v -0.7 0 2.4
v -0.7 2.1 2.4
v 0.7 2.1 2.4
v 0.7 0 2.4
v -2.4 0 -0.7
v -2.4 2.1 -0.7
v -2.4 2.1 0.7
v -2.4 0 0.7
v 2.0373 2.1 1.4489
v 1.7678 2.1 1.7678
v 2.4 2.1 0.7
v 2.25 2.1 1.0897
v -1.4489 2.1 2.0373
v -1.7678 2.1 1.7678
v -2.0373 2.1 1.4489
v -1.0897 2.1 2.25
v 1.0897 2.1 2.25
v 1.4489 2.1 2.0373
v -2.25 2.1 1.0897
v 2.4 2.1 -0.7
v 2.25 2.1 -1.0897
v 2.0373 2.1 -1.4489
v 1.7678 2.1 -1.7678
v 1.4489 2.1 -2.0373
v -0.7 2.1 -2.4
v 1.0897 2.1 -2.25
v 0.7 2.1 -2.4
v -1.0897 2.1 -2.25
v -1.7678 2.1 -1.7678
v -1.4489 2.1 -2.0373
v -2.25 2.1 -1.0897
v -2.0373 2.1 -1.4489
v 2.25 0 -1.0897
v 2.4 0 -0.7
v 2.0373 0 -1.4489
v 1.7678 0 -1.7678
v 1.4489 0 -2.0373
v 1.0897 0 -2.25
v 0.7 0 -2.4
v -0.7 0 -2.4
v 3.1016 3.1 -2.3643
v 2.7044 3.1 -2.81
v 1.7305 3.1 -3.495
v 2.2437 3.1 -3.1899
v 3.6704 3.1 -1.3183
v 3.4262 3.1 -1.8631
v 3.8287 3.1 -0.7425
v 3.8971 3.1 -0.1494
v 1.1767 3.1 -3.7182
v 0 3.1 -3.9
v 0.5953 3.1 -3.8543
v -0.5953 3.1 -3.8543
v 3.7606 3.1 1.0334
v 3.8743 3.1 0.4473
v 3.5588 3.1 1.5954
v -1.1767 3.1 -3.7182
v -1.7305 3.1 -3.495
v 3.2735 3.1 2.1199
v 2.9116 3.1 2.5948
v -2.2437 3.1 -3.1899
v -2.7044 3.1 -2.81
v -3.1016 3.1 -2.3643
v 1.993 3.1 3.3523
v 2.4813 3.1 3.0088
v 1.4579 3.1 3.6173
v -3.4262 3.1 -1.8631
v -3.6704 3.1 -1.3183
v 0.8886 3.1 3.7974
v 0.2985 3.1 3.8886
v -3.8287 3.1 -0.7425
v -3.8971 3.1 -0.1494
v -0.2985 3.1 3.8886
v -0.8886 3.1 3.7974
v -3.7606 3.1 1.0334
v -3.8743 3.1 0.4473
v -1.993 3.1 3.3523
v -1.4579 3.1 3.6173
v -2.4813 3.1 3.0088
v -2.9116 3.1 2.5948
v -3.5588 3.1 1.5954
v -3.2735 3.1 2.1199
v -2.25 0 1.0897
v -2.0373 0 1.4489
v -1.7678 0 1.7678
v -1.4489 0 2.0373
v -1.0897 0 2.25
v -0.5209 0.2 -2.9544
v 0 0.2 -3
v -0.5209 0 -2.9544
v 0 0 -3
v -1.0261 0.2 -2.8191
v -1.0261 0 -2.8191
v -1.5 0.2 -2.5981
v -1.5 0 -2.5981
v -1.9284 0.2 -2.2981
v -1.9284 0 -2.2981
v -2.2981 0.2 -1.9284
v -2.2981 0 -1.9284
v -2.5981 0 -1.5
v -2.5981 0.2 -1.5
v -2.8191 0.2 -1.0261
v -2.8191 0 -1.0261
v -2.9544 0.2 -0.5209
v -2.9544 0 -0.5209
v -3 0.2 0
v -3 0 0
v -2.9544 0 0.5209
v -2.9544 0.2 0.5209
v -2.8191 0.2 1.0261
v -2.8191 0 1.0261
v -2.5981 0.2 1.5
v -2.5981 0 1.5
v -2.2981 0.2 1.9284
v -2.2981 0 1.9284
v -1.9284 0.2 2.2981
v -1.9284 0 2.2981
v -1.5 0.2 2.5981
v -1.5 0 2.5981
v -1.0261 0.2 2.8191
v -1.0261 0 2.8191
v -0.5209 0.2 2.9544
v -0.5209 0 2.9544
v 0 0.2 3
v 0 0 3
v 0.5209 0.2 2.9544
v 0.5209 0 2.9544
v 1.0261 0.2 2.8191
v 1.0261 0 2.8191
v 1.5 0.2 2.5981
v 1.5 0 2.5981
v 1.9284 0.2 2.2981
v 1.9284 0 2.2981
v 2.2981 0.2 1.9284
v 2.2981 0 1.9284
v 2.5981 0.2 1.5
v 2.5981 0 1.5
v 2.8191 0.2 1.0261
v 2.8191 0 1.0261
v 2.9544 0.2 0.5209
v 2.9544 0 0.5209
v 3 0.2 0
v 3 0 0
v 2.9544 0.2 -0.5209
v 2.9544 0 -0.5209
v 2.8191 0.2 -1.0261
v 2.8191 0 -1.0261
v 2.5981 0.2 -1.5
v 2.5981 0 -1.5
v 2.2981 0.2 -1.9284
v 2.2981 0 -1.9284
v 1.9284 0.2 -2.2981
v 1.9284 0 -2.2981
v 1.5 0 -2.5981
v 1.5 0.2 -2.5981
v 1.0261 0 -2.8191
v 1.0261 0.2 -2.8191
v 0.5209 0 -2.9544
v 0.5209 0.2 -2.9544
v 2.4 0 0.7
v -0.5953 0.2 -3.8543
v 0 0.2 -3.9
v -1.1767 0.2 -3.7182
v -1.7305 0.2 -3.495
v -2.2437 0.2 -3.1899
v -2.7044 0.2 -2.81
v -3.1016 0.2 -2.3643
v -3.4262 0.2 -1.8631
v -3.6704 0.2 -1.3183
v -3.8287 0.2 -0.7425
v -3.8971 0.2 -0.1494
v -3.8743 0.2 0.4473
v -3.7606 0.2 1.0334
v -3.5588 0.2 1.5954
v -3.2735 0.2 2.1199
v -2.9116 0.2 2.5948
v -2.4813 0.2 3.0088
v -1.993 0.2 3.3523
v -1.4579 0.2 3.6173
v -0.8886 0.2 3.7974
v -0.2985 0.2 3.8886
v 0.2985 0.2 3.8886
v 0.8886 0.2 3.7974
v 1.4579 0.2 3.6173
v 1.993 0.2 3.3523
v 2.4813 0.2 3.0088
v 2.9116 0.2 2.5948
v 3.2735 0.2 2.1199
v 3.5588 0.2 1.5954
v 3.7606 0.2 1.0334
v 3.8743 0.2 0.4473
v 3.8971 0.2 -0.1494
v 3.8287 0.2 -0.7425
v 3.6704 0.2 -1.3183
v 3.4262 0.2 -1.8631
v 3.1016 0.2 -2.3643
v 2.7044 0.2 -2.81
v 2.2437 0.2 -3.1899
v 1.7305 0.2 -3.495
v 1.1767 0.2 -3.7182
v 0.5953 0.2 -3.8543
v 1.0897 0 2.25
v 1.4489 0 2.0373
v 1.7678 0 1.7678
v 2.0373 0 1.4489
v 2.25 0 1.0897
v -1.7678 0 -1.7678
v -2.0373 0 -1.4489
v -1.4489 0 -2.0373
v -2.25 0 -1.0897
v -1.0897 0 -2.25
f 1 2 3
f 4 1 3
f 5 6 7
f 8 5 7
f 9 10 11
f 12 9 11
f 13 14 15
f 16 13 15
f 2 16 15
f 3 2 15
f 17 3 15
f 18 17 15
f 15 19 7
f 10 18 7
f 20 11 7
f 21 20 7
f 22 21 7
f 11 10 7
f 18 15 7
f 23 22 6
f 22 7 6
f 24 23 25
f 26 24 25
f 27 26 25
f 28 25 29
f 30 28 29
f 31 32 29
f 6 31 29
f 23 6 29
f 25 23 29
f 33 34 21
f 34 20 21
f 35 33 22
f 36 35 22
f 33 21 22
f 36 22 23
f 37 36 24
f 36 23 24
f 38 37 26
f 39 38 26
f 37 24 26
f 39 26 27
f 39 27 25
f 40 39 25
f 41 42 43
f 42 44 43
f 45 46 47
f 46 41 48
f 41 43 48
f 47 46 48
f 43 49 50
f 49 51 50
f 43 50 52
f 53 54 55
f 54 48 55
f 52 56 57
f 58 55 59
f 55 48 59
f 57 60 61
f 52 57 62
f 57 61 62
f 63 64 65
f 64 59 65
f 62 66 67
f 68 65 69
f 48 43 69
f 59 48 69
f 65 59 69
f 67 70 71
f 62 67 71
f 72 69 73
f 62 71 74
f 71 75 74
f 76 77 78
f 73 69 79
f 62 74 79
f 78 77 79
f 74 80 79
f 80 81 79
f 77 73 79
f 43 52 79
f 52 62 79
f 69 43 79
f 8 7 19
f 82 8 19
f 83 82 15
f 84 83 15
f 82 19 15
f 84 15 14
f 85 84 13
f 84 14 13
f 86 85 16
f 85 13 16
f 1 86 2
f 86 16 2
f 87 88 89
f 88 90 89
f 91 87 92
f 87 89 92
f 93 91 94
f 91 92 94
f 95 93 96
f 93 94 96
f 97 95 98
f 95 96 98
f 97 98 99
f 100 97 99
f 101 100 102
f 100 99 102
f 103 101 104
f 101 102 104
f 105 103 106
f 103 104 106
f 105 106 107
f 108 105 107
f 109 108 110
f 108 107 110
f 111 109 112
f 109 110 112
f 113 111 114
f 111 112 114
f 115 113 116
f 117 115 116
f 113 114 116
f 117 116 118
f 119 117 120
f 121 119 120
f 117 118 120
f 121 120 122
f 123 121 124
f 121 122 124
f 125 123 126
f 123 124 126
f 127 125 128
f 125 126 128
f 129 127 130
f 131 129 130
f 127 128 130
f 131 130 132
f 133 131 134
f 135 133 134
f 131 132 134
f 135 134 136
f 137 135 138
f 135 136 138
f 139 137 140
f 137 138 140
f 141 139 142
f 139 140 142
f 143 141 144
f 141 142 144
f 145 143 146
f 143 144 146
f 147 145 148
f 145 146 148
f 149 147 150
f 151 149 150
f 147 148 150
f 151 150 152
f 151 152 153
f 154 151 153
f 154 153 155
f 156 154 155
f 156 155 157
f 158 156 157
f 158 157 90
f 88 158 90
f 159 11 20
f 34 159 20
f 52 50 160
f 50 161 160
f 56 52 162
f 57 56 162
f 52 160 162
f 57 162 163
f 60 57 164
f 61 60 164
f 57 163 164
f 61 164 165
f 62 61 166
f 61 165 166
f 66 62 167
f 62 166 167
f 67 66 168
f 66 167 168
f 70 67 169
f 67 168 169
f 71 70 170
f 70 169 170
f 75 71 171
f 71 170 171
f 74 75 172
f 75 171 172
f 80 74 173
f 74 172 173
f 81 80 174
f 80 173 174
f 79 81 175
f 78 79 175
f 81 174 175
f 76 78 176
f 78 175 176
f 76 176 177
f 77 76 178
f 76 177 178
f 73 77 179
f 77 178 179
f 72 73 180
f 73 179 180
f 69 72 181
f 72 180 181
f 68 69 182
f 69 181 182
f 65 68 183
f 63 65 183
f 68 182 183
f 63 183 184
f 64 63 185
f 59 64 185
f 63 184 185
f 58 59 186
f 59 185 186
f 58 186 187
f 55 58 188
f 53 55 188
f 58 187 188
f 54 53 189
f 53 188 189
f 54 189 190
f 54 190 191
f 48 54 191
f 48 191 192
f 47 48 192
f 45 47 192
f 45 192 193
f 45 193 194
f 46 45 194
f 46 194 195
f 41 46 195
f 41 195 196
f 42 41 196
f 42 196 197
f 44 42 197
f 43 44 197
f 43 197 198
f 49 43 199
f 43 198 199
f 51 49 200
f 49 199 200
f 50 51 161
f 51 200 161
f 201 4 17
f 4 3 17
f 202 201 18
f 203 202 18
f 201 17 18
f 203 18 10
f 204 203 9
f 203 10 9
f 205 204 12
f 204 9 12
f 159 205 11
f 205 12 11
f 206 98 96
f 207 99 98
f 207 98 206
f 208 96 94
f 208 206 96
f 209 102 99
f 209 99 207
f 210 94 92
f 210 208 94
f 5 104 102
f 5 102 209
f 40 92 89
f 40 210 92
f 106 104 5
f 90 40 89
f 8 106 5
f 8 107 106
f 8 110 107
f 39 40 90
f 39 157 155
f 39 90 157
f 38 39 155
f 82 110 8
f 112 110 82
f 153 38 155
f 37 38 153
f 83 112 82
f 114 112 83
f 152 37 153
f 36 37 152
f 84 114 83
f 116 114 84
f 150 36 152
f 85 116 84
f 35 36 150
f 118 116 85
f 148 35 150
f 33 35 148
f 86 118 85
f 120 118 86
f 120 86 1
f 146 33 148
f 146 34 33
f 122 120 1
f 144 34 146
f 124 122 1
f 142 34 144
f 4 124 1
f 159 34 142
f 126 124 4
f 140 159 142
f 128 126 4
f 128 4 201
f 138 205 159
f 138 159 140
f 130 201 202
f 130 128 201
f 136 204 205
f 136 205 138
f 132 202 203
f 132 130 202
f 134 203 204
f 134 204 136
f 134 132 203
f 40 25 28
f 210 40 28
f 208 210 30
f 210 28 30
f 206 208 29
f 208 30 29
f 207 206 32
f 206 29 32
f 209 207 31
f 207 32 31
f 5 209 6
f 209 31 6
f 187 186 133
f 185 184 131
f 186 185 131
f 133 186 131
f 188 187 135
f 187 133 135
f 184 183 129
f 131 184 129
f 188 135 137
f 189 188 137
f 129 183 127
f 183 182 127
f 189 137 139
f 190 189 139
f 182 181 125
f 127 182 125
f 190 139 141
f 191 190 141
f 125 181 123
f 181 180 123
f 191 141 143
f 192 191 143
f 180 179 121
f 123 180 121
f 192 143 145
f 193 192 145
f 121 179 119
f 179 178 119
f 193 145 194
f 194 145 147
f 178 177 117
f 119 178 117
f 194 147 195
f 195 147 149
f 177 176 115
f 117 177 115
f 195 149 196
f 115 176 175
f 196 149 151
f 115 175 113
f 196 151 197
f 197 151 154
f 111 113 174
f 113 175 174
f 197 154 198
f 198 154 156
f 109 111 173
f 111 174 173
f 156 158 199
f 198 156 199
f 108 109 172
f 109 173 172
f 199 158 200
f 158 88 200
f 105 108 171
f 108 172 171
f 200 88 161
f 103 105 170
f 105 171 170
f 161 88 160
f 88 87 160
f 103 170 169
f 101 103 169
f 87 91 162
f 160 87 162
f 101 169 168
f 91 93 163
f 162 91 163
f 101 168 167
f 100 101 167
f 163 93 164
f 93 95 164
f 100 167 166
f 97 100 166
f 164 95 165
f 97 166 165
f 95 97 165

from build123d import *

# Parameters (mm, degrees)
GRIPPING_RIBS_DEPTH = 2.1


with BuildPart() as part:
    # Sketch1 → Main Body (revolve)
    with BuildSketch(Plane.XY, mode=Mode.PRIVATE) as main_body_sk:
        Polygon((0, 3.1), (-3.9, 3.1), (-3.9, 0.2), (-3, 0.2), (-3, 0), (-2.5, 0), (-2.5, 2.1), (0, 2.1), align=None)
    revolve(main_body_sk.sketch.rotate(Axis((0, 0, 0), (0, 1, 0)), 270), axis=Axis((0, 0, 0), (0, 1, 0)))

    # Sketch2 → Gripping Ribs (add)
    with BuildSketch(Plane.XZ.offset(-2.1)):
        with BuildLine():
            Line((-0.7, 2.4), (0.7, 2.4))
            ThreePointArc((0.7, 2.4), (0, 2.5), (-0.7, 2.4))
        make_face()
        with BuildLine():
            ThreePointArc((-2.4, 0.7), (-2.5, 0), (-2.4, -0.7))
            Line((-2.4, -0.7), (-2.4, 0.7))
        make_face()
        with BuildLine():
            Line((2.4, 0.7), (2.4, -0.7))
            ThreePointArc((2.4, -0.7), (2.474873734, -0.353553391), (2.5, 0))
            ThreePointArc((2.5, 0), (2.474873734, 0.353553391), (2.4, 0.7))
        make_face()
        with BuildLine():
            ThreePointArc((-0.7, -2.4), (0, -2.5), (0.7, -2.4))
            Line((0.7, -2.4), (-0.7, -2.4))
        make_face()
    extrude(amount=GRIPPING_RIBS_DEPTH)


solid = part.part
